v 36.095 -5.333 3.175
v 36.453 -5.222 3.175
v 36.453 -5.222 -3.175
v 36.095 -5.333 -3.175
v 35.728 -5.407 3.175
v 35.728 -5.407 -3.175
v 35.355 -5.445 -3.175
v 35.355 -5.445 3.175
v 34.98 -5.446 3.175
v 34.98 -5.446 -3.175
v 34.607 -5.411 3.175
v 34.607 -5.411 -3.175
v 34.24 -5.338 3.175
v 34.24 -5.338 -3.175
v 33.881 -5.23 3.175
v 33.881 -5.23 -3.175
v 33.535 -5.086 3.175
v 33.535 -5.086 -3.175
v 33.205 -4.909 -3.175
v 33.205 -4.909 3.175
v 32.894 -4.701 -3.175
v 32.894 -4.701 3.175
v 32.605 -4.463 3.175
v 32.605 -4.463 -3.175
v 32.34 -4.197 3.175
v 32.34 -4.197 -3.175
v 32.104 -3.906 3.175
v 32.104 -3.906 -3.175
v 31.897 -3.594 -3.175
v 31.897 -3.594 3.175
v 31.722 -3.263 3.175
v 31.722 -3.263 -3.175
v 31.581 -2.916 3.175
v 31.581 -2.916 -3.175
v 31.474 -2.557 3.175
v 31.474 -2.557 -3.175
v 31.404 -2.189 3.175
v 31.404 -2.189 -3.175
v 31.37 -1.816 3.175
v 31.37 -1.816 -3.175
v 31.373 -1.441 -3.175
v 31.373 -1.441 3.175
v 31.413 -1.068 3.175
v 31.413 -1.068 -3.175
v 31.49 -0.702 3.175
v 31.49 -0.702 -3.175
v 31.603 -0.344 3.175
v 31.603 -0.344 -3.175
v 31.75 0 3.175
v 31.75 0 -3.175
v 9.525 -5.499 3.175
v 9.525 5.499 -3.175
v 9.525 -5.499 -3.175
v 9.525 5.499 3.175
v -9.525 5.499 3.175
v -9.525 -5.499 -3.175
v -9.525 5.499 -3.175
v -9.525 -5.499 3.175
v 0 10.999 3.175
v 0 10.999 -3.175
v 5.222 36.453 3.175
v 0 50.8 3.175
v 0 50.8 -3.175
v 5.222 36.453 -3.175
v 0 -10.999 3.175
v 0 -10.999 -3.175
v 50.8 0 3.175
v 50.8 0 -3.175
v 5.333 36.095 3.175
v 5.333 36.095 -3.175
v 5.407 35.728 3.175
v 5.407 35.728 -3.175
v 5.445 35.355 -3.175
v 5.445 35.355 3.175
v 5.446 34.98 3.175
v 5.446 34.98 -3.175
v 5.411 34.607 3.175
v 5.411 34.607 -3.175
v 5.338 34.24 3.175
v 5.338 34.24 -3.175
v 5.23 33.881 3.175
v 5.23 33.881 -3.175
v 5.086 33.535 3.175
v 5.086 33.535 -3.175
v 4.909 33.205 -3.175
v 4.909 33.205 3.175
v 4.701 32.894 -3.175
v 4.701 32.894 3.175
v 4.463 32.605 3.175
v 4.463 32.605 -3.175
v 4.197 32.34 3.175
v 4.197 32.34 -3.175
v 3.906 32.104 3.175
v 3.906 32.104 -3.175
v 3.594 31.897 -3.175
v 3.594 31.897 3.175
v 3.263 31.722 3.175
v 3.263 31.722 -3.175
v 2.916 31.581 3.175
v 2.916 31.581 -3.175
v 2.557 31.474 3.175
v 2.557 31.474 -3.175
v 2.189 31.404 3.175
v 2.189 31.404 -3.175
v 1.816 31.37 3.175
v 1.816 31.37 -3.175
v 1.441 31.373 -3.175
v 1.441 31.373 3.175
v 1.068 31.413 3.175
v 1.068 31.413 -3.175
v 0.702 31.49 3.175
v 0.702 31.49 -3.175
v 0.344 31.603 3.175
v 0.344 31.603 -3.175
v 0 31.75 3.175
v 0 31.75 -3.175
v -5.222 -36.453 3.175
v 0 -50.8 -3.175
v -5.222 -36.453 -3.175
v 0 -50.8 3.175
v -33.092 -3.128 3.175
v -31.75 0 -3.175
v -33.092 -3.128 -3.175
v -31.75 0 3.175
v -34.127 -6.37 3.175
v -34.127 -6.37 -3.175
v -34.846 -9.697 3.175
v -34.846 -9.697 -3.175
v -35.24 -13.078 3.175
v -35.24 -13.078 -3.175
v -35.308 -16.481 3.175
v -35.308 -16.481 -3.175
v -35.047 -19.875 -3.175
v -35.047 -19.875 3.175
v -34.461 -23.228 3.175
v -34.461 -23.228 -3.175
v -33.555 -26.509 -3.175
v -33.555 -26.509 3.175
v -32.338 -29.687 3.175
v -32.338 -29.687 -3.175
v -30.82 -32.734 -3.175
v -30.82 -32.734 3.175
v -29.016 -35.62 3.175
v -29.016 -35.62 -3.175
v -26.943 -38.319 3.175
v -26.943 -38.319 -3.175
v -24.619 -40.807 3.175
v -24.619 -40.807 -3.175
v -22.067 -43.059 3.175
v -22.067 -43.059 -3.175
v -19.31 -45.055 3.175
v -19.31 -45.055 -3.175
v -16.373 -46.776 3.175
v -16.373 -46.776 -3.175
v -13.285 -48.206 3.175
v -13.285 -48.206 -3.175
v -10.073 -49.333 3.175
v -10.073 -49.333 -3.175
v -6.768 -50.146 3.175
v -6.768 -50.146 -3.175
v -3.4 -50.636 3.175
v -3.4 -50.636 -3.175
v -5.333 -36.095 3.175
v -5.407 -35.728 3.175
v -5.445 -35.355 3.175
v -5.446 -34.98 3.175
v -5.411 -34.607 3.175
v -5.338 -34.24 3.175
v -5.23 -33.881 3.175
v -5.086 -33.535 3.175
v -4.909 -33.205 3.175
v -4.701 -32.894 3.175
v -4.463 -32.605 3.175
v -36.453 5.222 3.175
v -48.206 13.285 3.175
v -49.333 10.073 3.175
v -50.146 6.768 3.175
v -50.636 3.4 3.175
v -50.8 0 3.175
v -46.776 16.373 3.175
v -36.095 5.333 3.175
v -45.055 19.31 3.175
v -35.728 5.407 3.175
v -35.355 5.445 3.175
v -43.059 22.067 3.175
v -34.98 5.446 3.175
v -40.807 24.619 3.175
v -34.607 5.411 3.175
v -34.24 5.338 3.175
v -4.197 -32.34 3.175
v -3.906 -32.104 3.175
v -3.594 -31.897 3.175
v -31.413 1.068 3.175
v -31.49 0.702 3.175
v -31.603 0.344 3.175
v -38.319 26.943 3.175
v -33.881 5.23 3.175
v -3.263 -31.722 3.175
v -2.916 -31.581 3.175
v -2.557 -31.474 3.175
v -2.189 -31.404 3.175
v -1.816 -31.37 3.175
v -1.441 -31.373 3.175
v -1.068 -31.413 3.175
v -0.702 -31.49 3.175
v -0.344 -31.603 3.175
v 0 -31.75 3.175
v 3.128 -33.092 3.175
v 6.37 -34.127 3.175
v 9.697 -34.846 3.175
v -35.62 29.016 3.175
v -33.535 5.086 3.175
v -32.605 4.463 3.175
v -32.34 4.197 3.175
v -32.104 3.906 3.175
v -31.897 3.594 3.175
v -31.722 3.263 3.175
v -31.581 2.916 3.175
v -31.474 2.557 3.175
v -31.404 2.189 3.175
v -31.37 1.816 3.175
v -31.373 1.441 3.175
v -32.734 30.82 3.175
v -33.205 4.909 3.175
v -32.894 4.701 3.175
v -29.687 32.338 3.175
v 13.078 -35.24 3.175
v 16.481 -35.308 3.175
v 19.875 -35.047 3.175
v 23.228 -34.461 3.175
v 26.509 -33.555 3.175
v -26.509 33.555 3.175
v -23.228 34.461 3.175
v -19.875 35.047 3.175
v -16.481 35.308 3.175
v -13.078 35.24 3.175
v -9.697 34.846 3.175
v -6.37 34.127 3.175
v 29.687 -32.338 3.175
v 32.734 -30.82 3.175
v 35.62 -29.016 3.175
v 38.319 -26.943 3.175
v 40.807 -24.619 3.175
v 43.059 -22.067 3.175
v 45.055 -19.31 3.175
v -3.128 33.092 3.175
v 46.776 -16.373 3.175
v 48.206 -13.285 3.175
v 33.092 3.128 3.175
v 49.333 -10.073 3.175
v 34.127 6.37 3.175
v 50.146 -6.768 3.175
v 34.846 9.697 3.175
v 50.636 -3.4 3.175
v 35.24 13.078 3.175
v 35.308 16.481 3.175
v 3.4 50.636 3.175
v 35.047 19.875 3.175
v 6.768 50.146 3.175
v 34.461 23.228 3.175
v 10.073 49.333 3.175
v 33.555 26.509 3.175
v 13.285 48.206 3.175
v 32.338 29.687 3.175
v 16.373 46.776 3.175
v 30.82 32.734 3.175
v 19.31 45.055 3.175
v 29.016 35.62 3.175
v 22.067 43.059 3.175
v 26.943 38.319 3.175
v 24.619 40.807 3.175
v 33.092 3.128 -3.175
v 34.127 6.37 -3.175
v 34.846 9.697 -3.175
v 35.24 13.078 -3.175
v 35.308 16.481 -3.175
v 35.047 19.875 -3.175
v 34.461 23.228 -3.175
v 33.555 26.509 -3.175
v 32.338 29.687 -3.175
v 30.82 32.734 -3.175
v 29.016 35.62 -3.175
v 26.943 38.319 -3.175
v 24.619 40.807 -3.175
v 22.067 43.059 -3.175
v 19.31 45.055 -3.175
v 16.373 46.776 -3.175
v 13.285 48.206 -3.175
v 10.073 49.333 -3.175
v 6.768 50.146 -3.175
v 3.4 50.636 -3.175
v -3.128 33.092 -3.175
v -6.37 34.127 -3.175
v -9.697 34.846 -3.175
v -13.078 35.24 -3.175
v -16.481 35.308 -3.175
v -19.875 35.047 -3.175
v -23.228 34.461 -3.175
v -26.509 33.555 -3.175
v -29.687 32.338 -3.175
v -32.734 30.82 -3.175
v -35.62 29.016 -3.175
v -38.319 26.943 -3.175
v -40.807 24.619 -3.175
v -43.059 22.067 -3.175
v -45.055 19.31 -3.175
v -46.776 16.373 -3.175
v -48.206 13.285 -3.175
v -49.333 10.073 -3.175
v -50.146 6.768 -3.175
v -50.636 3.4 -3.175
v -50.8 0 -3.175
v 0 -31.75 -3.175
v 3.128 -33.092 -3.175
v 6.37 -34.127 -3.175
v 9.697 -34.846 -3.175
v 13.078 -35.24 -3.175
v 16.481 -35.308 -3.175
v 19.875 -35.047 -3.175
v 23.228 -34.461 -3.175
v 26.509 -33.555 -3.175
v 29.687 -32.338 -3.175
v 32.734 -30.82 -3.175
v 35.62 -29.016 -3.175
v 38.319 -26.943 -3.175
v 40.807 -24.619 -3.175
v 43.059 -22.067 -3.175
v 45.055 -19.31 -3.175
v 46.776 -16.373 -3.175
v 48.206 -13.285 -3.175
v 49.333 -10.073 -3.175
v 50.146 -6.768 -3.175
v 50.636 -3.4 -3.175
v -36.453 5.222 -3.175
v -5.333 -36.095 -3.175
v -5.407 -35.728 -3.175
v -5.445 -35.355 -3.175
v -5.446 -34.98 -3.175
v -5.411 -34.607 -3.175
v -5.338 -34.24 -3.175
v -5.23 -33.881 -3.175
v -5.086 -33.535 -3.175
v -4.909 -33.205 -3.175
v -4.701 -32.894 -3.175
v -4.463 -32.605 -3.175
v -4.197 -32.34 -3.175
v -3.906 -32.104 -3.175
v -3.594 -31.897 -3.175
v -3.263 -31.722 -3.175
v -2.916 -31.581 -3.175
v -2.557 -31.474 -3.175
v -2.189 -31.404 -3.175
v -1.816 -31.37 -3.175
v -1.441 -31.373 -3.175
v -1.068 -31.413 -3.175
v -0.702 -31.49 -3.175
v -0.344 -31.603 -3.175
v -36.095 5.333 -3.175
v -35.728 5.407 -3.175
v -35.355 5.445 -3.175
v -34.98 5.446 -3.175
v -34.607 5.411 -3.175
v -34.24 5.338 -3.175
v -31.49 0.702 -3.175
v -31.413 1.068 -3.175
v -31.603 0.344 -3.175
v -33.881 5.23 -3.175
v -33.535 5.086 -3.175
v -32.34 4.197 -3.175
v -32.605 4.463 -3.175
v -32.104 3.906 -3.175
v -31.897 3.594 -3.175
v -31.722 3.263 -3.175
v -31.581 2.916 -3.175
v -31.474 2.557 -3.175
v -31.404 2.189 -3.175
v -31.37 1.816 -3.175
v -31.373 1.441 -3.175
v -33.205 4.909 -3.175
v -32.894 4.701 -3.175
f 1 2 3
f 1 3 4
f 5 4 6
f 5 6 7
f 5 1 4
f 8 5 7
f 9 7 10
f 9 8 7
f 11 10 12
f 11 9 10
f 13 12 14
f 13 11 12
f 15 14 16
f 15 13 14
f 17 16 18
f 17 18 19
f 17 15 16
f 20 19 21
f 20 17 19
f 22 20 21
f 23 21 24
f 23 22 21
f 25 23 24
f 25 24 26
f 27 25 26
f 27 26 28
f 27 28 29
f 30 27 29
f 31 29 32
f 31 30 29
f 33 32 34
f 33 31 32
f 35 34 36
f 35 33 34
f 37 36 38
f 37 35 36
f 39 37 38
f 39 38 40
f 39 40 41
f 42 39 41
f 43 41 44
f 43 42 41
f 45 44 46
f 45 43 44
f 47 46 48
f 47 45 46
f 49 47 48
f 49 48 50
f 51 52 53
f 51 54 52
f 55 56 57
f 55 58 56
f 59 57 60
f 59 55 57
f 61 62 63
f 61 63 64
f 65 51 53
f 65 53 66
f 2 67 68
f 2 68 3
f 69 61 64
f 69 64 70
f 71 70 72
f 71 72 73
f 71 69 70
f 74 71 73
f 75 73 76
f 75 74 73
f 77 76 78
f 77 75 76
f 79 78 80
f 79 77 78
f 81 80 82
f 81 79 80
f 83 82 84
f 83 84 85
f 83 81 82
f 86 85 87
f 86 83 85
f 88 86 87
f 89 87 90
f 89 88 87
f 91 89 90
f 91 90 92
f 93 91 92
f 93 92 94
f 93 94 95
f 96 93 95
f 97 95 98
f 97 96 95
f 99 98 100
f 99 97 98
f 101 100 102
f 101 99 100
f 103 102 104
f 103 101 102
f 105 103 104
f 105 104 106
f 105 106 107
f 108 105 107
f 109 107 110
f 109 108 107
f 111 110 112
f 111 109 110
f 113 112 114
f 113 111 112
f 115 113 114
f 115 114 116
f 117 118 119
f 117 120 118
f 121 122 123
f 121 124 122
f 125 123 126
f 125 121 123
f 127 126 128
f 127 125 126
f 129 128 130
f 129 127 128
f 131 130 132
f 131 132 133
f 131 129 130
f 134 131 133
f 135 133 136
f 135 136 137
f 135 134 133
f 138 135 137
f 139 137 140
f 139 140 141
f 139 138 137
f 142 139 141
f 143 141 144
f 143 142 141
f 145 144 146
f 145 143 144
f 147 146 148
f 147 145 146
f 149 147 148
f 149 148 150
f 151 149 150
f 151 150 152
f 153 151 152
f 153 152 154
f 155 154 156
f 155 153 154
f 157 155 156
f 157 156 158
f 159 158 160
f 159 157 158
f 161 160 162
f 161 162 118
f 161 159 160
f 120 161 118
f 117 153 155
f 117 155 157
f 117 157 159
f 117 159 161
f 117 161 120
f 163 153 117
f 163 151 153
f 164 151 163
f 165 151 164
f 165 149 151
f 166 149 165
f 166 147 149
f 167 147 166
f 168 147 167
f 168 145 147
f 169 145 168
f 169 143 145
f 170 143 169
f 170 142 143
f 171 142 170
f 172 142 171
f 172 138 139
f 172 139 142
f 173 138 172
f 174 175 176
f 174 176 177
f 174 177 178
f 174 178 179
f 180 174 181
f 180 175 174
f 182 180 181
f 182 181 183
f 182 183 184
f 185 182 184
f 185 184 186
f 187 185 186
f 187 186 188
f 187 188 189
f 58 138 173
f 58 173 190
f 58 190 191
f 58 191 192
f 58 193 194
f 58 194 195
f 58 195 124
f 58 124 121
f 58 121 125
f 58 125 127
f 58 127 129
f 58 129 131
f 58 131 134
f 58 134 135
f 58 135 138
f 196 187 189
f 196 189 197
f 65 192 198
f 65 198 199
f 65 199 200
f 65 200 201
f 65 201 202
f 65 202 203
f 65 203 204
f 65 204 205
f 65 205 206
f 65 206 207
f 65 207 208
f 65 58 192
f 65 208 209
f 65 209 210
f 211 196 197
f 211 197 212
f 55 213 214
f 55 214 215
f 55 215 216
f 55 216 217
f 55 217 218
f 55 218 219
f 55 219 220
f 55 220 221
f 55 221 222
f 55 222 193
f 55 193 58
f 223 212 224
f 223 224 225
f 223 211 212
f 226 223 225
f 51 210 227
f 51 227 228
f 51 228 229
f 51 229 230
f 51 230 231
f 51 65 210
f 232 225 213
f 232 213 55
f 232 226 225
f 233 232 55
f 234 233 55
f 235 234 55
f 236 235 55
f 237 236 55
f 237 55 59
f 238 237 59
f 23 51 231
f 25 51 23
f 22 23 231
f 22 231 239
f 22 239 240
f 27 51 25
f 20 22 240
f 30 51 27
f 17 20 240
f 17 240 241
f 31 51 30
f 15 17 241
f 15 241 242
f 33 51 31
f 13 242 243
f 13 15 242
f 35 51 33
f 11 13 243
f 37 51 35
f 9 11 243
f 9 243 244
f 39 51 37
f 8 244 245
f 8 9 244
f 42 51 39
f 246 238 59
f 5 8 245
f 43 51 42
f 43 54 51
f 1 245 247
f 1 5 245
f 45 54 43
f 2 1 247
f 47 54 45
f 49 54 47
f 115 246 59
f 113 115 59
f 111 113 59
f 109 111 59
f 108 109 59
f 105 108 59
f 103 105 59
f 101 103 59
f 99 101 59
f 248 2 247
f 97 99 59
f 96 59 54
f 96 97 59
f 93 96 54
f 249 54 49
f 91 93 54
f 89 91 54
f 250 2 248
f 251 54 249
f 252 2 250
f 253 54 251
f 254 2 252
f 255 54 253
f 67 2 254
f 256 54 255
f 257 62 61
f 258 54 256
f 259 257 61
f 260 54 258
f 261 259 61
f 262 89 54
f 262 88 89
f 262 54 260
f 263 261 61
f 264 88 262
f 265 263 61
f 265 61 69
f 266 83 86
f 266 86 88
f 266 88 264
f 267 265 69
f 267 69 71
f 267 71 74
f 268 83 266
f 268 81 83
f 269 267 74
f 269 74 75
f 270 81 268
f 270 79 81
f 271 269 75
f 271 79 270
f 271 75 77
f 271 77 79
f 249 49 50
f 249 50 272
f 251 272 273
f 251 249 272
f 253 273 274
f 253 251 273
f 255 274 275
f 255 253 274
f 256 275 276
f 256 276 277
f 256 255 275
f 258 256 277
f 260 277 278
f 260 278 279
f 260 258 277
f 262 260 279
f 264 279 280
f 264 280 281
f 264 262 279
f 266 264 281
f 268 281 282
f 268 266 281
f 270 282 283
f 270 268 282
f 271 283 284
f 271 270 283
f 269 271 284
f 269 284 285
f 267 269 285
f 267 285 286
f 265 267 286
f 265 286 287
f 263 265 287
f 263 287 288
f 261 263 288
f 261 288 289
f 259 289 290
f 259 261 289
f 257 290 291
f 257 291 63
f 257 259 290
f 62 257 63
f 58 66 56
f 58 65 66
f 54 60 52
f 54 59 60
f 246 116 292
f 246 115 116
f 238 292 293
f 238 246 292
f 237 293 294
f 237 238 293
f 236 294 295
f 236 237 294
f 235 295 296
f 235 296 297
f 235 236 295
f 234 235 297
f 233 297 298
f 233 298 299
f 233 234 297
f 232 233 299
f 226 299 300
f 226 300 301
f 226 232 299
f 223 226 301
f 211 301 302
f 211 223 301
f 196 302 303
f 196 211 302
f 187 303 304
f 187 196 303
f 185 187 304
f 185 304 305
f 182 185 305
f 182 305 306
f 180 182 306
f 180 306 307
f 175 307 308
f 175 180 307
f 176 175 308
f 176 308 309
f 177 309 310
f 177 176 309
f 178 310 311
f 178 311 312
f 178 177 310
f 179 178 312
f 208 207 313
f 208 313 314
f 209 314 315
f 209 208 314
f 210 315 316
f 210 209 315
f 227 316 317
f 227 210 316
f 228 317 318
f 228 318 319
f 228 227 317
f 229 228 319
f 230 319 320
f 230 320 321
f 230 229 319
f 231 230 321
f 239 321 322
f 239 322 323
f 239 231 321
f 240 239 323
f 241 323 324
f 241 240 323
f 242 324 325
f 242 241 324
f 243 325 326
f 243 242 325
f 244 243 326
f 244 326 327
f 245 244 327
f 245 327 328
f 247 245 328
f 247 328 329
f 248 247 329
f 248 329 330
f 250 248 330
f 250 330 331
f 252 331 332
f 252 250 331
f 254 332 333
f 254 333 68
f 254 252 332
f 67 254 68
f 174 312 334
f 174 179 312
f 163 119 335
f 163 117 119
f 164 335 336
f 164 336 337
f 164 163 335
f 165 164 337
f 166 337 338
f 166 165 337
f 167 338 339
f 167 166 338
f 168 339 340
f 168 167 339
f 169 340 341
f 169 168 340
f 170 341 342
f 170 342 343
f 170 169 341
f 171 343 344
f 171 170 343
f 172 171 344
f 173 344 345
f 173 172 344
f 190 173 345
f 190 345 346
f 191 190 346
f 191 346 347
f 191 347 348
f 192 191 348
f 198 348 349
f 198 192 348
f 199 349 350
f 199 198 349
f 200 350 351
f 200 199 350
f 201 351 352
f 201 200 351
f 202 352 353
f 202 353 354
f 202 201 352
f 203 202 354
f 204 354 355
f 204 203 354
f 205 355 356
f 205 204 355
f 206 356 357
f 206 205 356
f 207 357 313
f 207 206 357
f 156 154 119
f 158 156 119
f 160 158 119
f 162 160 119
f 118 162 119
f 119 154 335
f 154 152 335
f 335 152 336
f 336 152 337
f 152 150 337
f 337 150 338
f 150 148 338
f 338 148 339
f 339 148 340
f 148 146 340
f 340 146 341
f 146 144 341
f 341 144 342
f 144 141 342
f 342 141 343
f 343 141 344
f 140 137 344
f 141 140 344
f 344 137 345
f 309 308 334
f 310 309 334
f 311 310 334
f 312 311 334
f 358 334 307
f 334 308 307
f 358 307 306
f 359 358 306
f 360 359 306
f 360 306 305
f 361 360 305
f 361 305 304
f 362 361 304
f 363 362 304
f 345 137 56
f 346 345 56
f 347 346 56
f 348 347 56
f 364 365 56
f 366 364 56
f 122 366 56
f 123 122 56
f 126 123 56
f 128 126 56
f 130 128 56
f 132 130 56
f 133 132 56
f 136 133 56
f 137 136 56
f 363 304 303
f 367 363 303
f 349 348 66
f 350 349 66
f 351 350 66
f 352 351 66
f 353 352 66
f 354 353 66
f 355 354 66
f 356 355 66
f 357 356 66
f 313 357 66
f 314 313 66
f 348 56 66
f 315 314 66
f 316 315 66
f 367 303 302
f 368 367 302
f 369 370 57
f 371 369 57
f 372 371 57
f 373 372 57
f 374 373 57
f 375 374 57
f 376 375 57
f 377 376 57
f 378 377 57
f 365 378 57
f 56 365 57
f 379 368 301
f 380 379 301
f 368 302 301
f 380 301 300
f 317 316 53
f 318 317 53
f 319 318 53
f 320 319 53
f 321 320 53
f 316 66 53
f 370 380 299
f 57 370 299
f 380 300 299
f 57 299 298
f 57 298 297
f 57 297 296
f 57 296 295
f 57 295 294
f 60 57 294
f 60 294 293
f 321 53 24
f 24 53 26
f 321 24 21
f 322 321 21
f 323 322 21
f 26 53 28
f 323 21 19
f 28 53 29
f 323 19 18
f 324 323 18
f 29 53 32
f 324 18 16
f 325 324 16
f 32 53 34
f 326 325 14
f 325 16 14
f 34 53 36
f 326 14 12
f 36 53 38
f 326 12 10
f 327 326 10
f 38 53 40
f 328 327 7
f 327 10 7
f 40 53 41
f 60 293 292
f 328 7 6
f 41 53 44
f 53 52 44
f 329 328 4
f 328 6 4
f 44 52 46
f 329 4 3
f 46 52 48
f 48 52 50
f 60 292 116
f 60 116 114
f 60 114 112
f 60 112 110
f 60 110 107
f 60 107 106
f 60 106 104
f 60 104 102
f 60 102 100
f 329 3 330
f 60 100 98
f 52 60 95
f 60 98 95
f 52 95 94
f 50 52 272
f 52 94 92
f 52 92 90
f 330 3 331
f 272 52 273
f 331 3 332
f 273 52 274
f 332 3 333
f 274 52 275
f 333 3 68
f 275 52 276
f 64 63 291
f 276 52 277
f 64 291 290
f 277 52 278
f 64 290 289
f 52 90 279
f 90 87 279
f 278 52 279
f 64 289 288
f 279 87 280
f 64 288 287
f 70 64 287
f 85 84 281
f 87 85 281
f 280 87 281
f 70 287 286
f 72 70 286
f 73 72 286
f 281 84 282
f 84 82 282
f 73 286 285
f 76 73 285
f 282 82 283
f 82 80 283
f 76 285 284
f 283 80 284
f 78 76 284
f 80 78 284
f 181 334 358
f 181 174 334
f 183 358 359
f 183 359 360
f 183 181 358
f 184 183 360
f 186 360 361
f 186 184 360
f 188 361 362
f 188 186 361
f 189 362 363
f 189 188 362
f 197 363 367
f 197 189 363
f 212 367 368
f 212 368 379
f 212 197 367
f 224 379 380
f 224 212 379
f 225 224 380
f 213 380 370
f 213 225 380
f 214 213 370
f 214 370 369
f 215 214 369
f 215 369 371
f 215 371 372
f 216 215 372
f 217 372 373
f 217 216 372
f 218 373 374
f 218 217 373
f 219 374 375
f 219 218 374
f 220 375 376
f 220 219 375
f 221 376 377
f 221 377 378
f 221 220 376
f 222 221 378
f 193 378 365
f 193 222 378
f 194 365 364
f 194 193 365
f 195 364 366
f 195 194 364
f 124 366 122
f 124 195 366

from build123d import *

# Parameters (mm, degrees)
BOSS_EXTRUDE1_DEPTH = 3.175


with BuildPart() as part:
    # Sketch2 → Boss-Extrude1 (new body, symmetric)
    with BuildSketch(Plane.XY):
        with BuildLine():
            ThreePointArc((-5.221965604, -36.452767418), (-4.196850428, -32.340432027), (0, -31.75))
            ThreePointArc((0, -31.75), (34.198681309, -29.952890094), (50.8, 0))
            Line((50.8, 0), (36.452767418, -5.221965604))
            ThreePointArc((36.452767418, -5.221965604), (32.340432027, -4.196850428), (31.75, 0))
            ThreePointArc((31.75, 0), (29.952890094, 34.198681309), (0, 50.8))
            Line((0, 50.8), (5.221965604, 36.452767418))
            ThreePointArc((5.221965604, 36.452767418), (4.196850428, 32.340432027), (0, 31.75))
            ThreePointArc((0, 31.75), (-34.198681309, 29.952890094), (-50.8, 0))
            Line((-50.8, 0), (-36.452767418, 5.221965604))
            ThreePointArc((-36.452767418, 5.221965604), (-32.340432027, 4.196850428), (-31.75, 0))
            ThreePointArc((-31.75, 0), (-29.952890094, -34.198681309), (0, -50.8))
            Line((0, -50.8), (-5.221965604, -36.452767418))
        make_face()
        Polygon((9.525, -5.499261314), (0, -10.998522628), (-9.525, -5.499261314), (-9.525, 5.499261314), (0, 10.998522628), (9.525, 5.499261314), align=None, mode=Mode.SUBTRACT)
    extrude(amount=BOSS_EXTRUDE1_DEPTH, both=True)


solid = part.part
